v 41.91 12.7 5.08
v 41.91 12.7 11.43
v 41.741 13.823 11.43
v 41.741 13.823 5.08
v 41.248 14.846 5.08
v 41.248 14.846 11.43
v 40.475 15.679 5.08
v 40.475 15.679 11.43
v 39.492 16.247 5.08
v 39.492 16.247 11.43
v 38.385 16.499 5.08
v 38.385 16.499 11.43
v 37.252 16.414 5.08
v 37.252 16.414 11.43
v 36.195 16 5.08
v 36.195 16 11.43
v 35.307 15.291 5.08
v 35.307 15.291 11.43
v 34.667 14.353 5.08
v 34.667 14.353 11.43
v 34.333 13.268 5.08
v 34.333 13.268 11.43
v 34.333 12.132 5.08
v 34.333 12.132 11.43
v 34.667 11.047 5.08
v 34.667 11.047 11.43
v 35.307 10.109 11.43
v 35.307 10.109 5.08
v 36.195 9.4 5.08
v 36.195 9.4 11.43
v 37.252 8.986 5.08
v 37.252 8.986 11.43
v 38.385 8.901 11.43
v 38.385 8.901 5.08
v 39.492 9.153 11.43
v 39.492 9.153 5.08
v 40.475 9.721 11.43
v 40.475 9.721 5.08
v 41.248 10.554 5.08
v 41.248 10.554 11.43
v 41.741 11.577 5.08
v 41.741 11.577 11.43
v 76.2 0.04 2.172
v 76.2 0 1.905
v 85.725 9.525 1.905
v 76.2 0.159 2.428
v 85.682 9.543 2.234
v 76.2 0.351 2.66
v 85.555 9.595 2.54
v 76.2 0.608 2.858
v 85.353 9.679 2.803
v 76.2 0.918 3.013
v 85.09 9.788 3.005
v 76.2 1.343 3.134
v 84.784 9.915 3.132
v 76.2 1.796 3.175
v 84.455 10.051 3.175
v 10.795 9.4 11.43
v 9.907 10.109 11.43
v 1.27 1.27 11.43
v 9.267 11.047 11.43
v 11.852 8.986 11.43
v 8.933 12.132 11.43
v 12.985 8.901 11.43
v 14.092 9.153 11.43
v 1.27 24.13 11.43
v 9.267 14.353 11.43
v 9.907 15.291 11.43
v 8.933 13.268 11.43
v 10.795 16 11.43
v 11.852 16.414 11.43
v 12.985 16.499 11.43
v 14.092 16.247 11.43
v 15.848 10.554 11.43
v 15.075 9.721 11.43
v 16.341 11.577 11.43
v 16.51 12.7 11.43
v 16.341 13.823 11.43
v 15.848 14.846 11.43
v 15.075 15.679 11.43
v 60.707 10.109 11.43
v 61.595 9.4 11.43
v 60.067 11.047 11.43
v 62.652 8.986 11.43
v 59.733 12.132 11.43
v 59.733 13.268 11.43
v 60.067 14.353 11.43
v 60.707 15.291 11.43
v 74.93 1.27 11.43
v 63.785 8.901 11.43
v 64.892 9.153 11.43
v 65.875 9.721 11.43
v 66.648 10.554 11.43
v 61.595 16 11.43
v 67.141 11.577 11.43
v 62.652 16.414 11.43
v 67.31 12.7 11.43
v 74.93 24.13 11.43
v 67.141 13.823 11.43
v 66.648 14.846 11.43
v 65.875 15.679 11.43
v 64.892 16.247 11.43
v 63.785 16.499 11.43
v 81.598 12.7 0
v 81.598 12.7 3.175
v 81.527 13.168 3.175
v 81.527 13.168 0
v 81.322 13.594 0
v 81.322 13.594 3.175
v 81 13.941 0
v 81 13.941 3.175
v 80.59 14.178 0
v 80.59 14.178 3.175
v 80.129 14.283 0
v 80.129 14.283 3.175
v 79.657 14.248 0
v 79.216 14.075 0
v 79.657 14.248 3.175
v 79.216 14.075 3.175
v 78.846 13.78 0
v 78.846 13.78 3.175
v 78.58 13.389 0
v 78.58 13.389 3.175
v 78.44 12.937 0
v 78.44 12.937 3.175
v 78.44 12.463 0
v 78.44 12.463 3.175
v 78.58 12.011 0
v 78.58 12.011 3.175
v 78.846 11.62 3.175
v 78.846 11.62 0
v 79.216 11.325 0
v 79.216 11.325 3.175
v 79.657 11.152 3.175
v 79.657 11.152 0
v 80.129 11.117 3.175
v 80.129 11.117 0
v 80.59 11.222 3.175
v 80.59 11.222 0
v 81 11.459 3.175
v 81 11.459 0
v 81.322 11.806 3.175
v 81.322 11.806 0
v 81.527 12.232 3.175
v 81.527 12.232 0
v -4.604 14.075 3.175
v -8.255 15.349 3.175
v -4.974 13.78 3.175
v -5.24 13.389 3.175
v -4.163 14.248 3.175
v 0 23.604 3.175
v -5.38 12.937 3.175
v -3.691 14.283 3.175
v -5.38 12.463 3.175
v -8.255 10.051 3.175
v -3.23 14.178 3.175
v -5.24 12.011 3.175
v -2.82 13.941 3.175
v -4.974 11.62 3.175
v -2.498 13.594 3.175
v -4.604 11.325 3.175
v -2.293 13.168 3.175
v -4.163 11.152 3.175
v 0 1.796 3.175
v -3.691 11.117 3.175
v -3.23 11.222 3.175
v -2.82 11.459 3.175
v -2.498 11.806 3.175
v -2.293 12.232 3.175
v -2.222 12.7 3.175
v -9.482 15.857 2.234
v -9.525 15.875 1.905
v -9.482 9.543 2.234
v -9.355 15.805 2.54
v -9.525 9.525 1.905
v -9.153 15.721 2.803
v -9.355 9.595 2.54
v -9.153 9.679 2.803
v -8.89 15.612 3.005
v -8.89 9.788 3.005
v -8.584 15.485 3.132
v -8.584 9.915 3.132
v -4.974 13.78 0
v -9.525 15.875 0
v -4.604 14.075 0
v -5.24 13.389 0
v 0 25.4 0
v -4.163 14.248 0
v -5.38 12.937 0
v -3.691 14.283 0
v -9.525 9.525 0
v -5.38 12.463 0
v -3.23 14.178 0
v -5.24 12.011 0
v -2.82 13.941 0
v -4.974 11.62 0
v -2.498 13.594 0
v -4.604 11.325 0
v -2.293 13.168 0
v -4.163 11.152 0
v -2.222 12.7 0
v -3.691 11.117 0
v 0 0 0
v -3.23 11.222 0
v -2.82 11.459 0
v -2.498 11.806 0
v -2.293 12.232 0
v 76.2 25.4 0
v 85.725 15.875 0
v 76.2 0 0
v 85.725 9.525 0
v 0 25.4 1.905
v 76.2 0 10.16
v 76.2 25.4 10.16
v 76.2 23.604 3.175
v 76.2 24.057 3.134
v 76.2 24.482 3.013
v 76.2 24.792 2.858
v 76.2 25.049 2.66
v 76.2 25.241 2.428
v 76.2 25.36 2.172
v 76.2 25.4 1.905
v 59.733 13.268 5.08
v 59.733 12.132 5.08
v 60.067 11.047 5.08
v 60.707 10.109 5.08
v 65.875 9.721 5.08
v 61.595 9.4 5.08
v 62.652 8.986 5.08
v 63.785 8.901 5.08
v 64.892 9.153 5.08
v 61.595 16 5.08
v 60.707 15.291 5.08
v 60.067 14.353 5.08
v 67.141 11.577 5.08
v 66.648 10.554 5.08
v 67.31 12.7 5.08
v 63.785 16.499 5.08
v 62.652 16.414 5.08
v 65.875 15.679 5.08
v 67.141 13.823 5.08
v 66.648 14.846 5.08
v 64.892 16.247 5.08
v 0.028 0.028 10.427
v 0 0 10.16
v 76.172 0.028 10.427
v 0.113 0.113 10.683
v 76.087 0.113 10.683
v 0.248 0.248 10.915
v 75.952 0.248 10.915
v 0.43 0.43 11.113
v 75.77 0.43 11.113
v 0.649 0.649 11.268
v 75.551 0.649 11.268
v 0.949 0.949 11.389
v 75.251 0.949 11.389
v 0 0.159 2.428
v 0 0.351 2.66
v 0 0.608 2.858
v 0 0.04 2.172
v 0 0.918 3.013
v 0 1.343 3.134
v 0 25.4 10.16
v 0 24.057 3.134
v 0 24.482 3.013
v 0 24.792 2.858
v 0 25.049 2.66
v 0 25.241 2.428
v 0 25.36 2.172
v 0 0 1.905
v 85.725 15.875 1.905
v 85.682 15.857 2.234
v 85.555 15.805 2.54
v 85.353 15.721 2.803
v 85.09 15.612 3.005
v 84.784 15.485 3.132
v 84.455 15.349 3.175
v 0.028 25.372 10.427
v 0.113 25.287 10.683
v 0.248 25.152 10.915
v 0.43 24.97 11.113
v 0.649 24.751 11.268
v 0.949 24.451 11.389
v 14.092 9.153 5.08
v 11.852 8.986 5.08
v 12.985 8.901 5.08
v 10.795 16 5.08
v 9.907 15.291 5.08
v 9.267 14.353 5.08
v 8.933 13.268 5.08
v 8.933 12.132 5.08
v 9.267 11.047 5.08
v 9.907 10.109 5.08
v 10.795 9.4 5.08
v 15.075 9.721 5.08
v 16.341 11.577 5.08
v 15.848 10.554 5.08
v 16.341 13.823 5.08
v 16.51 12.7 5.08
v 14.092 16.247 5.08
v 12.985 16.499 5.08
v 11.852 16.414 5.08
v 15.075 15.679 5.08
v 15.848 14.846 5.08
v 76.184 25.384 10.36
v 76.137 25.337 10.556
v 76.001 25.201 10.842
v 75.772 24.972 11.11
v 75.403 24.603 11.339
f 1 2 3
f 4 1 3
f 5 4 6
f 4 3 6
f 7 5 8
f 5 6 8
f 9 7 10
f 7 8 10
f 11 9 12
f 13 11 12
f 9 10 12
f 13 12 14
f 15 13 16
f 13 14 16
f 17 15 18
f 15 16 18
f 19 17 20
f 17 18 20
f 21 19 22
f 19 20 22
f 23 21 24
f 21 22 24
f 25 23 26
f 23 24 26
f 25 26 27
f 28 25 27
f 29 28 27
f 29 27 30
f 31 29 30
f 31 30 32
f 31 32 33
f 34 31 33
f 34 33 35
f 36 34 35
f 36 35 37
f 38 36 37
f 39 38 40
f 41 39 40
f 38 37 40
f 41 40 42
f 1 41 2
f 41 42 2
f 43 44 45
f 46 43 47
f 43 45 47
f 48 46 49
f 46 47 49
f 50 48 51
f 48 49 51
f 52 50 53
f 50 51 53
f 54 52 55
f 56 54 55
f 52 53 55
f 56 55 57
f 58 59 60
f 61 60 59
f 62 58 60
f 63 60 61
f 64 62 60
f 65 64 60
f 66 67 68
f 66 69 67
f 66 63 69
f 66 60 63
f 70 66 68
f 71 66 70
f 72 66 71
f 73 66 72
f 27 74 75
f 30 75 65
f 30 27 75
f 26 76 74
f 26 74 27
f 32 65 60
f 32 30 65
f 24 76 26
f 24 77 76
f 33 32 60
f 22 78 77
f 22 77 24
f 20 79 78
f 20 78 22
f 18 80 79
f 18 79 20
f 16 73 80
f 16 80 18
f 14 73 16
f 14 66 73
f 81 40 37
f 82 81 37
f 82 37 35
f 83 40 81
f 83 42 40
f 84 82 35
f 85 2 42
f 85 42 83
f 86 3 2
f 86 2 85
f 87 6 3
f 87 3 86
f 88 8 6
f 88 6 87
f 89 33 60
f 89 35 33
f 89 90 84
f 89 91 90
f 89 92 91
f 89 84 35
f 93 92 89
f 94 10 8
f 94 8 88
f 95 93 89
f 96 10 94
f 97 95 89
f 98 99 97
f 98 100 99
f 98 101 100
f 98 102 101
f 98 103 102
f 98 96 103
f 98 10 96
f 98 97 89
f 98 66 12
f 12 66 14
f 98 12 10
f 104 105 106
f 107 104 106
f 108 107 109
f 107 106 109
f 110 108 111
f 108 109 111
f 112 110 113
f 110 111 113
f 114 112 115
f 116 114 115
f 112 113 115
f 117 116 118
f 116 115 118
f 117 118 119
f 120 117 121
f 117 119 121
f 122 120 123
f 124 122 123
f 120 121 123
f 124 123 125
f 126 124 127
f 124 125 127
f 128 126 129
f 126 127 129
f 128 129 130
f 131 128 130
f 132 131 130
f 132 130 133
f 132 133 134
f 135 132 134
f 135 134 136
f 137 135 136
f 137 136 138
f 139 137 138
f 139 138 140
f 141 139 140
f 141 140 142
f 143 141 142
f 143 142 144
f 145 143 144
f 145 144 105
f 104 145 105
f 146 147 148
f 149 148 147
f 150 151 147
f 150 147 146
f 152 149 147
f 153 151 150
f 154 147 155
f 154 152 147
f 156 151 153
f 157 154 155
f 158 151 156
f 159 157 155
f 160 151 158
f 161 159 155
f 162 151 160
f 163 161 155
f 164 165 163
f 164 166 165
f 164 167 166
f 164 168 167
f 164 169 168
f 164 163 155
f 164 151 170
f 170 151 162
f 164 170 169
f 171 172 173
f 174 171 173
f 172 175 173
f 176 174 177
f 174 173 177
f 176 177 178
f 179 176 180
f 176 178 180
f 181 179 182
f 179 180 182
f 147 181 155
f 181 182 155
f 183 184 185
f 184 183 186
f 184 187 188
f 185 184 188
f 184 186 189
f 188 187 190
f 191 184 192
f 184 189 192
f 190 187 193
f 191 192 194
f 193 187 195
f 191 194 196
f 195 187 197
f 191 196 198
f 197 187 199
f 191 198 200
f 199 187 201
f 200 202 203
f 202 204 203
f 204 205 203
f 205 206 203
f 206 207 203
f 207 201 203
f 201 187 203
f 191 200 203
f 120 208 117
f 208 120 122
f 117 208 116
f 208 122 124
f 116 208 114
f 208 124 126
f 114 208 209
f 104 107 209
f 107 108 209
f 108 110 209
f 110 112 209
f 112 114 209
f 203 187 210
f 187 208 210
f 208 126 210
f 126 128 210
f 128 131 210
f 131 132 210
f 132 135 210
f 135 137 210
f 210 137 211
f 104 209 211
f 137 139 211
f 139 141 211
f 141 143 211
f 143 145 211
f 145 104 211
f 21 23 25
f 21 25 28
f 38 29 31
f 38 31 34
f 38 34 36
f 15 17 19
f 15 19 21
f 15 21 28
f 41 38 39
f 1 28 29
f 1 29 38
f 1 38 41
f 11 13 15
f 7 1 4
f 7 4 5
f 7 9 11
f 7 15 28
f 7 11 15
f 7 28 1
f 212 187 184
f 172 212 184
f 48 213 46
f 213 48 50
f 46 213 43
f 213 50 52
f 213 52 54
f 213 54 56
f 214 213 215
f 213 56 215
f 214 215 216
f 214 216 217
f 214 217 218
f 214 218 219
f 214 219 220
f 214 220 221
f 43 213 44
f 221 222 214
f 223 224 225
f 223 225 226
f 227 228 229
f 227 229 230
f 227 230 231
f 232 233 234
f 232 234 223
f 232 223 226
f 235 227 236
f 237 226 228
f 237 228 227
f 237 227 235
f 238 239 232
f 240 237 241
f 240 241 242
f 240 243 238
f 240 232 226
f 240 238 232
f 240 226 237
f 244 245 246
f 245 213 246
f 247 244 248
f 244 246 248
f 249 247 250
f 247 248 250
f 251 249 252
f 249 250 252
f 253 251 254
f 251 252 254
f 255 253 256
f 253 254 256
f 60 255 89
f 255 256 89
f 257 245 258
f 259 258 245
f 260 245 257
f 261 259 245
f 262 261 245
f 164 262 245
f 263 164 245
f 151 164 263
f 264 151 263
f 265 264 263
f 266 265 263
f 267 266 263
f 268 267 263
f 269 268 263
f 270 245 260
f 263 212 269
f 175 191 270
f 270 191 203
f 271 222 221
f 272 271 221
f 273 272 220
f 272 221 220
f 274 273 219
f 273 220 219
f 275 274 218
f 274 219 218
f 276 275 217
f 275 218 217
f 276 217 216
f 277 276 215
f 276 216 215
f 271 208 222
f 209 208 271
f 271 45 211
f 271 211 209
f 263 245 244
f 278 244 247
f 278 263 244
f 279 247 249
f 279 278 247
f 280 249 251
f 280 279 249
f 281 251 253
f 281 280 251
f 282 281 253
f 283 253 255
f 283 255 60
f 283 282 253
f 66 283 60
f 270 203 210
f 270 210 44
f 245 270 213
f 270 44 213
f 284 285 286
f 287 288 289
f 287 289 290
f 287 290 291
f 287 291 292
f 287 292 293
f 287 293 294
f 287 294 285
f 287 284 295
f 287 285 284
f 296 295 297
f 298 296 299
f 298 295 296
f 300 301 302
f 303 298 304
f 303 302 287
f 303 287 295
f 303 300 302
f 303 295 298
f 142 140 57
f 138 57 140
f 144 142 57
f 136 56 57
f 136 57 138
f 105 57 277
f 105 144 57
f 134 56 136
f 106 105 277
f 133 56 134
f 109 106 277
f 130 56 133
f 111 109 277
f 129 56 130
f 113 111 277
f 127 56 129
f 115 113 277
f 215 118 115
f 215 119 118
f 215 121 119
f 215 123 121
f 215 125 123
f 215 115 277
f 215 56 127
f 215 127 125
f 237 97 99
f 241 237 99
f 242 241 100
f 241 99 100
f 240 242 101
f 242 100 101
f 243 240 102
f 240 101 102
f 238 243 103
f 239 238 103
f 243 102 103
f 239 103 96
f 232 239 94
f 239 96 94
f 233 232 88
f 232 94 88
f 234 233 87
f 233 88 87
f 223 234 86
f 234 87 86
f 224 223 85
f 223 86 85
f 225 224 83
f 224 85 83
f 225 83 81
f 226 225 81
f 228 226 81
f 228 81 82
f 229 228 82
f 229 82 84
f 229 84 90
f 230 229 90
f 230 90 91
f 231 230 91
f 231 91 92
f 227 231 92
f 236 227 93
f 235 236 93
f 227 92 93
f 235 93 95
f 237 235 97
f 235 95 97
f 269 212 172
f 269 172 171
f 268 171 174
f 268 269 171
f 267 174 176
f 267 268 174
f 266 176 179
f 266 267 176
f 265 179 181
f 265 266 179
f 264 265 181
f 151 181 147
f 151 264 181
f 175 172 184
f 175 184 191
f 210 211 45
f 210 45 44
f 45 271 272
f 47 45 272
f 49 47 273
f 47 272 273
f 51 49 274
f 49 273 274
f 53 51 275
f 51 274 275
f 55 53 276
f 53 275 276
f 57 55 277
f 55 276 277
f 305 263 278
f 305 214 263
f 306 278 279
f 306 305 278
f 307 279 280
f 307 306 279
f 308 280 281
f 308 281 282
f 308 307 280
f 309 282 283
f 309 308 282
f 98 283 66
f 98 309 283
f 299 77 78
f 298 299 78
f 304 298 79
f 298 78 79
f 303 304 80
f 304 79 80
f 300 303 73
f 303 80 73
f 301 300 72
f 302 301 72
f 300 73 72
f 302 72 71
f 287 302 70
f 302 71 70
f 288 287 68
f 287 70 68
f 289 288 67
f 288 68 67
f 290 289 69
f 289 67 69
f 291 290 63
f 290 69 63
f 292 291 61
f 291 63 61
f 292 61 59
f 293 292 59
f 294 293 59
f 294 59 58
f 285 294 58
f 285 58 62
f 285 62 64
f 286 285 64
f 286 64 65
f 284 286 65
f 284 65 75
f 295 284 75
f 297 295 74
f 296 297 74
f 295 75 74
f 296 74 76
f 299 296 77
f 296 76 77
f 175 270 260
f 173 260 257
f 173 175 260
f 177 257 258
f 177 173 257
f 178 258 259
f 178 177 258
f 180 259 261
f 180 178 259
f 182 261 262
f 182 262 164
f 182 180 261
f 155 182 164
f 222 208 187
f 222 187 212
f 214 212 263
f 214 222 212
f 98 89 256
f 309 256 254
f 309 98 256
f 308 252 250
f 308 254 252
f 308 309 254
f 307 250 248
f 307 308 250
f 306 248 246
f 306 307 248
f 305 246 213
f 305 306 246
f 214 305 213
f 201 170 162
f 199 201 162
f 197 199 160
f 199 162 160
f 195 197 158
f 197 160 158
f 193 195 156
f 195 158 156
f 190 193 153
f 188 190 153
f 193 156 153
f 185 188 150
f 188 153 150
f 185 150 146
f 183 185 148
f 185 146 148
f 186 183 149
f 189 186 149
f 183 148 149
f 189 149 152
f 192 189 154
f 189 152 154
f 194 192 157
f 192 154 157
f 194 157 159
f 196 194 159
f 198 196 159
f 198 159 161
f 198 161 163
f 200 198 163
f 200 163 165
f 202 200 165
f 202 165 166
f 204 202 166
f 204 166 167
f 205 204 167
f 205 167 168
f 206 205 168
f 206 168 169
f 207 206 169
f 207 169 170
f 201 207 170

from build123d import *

# Parameters (mm, degrees)
F0_W        = 76.2
F0_H        = 25.4
F1_DEPTH    = 11.43
F2_R        = 3.81
F3_DEPTH    = 6.35
F4_R        = 1.27
F5_W        = 25.4
F5_H        = 3.175
F6_DEPTH    = 9.525
F7_W        = 25.4
F7_H        = 3.175
F8_DEPTH    = 9.525
F9_T1_DEPTH = 52.1655609208
F10_R       = 1.27
F11_R       = 1.5875
F12_DEPTH   = 25.4
F13_R       = 1.5875
F14_DEPTH   = 25.4


# Not quite as in the source:
# - a fillet or chamfer that OpenCascade refuses, or shapes differently, is made with other operations: its cross-section is extruded or revolved along the edge and cut away or added


with BuildPart() as f1:
    # F0 (on Top) → F1 (new body)
    with BuildSketch(Plane.XY):
        with Locations((38.1, 12.7)):
            Rectangle(F0_W, F0_H)
    extrude(amount=F1_DEPTH)

    # F2 (on face) → F3 (cut)
    with BuildSketch(Plane.XY.offset(11.43)):
        with Locations((12.7, 12.7)):
            Circle(F2_R)
        with Locations((38.1, 12.7)):
            Circle(F2_R)
        with Locations((63.5, 12.7)):
            Circle(F2_R)
    extrude(amount=-F3_DEPTH, mode=Mode.SUBTRACT)

    # F4
    f4_edges = [f1.edges().sort_by_distance(p)[0] for p in [
        (38.1, 0, 11.43),
        (76.2, 12.7, 11.43),
        (38.1, 25.4, 11.43),
        (0, 12.7, 11.43),
    ]]
    fillet(f4_edges, radius=F4_R)

    # F5 (on face) → F6 (join)
    with BuildSketch(Plane.YZ.offset(76.2)):
        with Locations((12.7, 1.5875)):
            Rectangle(F5_W, F5_H)
    extrude(amount=F6_DEPTH)

    # F7 (on face) → F8 (join)
    with BuildSketch(Plane(origin=(0, 0, 0), x_dir=(0, -1, 0), z_dir=(-1, 0, 0))):
        with Locations((-12.7, 1.5875)):
            Rectangle(F7_W, F7_H)
    extrude(amount=F8_DEPTH)

    # F9: chamfer of 9.525 on 6 edges, made by hand

    # F9_s2 → F9_t1 (cut)
    with BuildSketch(Plane.XY.offset(-24.4952804604)):
        Polygon((0, 25.4), (-9.525, 15.875), (-9.525, 25.4), align=None)
        Polygon((76.2, 25.4), (85.725, 15.875), (85.725, 25.4), align=None)
        Polygon((85.725, 9.525), (76.2, 0), (85.725, 0), align=None)
        Polygon((-9.525, 9.525), (0, 0), (-9.525, 0), align=None)
    extrude(amount=F9_T1_DEPTH, mode=Mode.SUBTRACT)

    # F10
    f10_edges = [f1.edges().sort_by_distance(p)[0] for p in [
        (-4.7625, 4.7625, 3.175),
        (-9.525, 12.7, 3.175),
        (-4.7625, 20.6375, 3.175),
        (80.9625, 4.7625, 3.175),
        (85.725, 12.7, 3.175),
        (80.9625, 20.6375, 3.175),
    ]]
    fillet(f10_edges, radius=F10_R)

    # F11 (on face) → F12 (cut)
    with BuildSketch(Plane.XY.offset(3.175)):
        with Locations((-3.81, 12.7)):
            Circle(F11_R)
    extrude(amount=-F12_DEPTH, mode=Mode.SUBTRACT)

    # F13 (on face) → F14 (cut)
    with BuildSketch(Plane.XY.offset(3.175)):
        with Locations((80.01, 12.7)):
            Circle(F13_R)
    extrude(amount=-F14_DEPTH, mode=Mode.SUBTRACT)


solid = f1.part
